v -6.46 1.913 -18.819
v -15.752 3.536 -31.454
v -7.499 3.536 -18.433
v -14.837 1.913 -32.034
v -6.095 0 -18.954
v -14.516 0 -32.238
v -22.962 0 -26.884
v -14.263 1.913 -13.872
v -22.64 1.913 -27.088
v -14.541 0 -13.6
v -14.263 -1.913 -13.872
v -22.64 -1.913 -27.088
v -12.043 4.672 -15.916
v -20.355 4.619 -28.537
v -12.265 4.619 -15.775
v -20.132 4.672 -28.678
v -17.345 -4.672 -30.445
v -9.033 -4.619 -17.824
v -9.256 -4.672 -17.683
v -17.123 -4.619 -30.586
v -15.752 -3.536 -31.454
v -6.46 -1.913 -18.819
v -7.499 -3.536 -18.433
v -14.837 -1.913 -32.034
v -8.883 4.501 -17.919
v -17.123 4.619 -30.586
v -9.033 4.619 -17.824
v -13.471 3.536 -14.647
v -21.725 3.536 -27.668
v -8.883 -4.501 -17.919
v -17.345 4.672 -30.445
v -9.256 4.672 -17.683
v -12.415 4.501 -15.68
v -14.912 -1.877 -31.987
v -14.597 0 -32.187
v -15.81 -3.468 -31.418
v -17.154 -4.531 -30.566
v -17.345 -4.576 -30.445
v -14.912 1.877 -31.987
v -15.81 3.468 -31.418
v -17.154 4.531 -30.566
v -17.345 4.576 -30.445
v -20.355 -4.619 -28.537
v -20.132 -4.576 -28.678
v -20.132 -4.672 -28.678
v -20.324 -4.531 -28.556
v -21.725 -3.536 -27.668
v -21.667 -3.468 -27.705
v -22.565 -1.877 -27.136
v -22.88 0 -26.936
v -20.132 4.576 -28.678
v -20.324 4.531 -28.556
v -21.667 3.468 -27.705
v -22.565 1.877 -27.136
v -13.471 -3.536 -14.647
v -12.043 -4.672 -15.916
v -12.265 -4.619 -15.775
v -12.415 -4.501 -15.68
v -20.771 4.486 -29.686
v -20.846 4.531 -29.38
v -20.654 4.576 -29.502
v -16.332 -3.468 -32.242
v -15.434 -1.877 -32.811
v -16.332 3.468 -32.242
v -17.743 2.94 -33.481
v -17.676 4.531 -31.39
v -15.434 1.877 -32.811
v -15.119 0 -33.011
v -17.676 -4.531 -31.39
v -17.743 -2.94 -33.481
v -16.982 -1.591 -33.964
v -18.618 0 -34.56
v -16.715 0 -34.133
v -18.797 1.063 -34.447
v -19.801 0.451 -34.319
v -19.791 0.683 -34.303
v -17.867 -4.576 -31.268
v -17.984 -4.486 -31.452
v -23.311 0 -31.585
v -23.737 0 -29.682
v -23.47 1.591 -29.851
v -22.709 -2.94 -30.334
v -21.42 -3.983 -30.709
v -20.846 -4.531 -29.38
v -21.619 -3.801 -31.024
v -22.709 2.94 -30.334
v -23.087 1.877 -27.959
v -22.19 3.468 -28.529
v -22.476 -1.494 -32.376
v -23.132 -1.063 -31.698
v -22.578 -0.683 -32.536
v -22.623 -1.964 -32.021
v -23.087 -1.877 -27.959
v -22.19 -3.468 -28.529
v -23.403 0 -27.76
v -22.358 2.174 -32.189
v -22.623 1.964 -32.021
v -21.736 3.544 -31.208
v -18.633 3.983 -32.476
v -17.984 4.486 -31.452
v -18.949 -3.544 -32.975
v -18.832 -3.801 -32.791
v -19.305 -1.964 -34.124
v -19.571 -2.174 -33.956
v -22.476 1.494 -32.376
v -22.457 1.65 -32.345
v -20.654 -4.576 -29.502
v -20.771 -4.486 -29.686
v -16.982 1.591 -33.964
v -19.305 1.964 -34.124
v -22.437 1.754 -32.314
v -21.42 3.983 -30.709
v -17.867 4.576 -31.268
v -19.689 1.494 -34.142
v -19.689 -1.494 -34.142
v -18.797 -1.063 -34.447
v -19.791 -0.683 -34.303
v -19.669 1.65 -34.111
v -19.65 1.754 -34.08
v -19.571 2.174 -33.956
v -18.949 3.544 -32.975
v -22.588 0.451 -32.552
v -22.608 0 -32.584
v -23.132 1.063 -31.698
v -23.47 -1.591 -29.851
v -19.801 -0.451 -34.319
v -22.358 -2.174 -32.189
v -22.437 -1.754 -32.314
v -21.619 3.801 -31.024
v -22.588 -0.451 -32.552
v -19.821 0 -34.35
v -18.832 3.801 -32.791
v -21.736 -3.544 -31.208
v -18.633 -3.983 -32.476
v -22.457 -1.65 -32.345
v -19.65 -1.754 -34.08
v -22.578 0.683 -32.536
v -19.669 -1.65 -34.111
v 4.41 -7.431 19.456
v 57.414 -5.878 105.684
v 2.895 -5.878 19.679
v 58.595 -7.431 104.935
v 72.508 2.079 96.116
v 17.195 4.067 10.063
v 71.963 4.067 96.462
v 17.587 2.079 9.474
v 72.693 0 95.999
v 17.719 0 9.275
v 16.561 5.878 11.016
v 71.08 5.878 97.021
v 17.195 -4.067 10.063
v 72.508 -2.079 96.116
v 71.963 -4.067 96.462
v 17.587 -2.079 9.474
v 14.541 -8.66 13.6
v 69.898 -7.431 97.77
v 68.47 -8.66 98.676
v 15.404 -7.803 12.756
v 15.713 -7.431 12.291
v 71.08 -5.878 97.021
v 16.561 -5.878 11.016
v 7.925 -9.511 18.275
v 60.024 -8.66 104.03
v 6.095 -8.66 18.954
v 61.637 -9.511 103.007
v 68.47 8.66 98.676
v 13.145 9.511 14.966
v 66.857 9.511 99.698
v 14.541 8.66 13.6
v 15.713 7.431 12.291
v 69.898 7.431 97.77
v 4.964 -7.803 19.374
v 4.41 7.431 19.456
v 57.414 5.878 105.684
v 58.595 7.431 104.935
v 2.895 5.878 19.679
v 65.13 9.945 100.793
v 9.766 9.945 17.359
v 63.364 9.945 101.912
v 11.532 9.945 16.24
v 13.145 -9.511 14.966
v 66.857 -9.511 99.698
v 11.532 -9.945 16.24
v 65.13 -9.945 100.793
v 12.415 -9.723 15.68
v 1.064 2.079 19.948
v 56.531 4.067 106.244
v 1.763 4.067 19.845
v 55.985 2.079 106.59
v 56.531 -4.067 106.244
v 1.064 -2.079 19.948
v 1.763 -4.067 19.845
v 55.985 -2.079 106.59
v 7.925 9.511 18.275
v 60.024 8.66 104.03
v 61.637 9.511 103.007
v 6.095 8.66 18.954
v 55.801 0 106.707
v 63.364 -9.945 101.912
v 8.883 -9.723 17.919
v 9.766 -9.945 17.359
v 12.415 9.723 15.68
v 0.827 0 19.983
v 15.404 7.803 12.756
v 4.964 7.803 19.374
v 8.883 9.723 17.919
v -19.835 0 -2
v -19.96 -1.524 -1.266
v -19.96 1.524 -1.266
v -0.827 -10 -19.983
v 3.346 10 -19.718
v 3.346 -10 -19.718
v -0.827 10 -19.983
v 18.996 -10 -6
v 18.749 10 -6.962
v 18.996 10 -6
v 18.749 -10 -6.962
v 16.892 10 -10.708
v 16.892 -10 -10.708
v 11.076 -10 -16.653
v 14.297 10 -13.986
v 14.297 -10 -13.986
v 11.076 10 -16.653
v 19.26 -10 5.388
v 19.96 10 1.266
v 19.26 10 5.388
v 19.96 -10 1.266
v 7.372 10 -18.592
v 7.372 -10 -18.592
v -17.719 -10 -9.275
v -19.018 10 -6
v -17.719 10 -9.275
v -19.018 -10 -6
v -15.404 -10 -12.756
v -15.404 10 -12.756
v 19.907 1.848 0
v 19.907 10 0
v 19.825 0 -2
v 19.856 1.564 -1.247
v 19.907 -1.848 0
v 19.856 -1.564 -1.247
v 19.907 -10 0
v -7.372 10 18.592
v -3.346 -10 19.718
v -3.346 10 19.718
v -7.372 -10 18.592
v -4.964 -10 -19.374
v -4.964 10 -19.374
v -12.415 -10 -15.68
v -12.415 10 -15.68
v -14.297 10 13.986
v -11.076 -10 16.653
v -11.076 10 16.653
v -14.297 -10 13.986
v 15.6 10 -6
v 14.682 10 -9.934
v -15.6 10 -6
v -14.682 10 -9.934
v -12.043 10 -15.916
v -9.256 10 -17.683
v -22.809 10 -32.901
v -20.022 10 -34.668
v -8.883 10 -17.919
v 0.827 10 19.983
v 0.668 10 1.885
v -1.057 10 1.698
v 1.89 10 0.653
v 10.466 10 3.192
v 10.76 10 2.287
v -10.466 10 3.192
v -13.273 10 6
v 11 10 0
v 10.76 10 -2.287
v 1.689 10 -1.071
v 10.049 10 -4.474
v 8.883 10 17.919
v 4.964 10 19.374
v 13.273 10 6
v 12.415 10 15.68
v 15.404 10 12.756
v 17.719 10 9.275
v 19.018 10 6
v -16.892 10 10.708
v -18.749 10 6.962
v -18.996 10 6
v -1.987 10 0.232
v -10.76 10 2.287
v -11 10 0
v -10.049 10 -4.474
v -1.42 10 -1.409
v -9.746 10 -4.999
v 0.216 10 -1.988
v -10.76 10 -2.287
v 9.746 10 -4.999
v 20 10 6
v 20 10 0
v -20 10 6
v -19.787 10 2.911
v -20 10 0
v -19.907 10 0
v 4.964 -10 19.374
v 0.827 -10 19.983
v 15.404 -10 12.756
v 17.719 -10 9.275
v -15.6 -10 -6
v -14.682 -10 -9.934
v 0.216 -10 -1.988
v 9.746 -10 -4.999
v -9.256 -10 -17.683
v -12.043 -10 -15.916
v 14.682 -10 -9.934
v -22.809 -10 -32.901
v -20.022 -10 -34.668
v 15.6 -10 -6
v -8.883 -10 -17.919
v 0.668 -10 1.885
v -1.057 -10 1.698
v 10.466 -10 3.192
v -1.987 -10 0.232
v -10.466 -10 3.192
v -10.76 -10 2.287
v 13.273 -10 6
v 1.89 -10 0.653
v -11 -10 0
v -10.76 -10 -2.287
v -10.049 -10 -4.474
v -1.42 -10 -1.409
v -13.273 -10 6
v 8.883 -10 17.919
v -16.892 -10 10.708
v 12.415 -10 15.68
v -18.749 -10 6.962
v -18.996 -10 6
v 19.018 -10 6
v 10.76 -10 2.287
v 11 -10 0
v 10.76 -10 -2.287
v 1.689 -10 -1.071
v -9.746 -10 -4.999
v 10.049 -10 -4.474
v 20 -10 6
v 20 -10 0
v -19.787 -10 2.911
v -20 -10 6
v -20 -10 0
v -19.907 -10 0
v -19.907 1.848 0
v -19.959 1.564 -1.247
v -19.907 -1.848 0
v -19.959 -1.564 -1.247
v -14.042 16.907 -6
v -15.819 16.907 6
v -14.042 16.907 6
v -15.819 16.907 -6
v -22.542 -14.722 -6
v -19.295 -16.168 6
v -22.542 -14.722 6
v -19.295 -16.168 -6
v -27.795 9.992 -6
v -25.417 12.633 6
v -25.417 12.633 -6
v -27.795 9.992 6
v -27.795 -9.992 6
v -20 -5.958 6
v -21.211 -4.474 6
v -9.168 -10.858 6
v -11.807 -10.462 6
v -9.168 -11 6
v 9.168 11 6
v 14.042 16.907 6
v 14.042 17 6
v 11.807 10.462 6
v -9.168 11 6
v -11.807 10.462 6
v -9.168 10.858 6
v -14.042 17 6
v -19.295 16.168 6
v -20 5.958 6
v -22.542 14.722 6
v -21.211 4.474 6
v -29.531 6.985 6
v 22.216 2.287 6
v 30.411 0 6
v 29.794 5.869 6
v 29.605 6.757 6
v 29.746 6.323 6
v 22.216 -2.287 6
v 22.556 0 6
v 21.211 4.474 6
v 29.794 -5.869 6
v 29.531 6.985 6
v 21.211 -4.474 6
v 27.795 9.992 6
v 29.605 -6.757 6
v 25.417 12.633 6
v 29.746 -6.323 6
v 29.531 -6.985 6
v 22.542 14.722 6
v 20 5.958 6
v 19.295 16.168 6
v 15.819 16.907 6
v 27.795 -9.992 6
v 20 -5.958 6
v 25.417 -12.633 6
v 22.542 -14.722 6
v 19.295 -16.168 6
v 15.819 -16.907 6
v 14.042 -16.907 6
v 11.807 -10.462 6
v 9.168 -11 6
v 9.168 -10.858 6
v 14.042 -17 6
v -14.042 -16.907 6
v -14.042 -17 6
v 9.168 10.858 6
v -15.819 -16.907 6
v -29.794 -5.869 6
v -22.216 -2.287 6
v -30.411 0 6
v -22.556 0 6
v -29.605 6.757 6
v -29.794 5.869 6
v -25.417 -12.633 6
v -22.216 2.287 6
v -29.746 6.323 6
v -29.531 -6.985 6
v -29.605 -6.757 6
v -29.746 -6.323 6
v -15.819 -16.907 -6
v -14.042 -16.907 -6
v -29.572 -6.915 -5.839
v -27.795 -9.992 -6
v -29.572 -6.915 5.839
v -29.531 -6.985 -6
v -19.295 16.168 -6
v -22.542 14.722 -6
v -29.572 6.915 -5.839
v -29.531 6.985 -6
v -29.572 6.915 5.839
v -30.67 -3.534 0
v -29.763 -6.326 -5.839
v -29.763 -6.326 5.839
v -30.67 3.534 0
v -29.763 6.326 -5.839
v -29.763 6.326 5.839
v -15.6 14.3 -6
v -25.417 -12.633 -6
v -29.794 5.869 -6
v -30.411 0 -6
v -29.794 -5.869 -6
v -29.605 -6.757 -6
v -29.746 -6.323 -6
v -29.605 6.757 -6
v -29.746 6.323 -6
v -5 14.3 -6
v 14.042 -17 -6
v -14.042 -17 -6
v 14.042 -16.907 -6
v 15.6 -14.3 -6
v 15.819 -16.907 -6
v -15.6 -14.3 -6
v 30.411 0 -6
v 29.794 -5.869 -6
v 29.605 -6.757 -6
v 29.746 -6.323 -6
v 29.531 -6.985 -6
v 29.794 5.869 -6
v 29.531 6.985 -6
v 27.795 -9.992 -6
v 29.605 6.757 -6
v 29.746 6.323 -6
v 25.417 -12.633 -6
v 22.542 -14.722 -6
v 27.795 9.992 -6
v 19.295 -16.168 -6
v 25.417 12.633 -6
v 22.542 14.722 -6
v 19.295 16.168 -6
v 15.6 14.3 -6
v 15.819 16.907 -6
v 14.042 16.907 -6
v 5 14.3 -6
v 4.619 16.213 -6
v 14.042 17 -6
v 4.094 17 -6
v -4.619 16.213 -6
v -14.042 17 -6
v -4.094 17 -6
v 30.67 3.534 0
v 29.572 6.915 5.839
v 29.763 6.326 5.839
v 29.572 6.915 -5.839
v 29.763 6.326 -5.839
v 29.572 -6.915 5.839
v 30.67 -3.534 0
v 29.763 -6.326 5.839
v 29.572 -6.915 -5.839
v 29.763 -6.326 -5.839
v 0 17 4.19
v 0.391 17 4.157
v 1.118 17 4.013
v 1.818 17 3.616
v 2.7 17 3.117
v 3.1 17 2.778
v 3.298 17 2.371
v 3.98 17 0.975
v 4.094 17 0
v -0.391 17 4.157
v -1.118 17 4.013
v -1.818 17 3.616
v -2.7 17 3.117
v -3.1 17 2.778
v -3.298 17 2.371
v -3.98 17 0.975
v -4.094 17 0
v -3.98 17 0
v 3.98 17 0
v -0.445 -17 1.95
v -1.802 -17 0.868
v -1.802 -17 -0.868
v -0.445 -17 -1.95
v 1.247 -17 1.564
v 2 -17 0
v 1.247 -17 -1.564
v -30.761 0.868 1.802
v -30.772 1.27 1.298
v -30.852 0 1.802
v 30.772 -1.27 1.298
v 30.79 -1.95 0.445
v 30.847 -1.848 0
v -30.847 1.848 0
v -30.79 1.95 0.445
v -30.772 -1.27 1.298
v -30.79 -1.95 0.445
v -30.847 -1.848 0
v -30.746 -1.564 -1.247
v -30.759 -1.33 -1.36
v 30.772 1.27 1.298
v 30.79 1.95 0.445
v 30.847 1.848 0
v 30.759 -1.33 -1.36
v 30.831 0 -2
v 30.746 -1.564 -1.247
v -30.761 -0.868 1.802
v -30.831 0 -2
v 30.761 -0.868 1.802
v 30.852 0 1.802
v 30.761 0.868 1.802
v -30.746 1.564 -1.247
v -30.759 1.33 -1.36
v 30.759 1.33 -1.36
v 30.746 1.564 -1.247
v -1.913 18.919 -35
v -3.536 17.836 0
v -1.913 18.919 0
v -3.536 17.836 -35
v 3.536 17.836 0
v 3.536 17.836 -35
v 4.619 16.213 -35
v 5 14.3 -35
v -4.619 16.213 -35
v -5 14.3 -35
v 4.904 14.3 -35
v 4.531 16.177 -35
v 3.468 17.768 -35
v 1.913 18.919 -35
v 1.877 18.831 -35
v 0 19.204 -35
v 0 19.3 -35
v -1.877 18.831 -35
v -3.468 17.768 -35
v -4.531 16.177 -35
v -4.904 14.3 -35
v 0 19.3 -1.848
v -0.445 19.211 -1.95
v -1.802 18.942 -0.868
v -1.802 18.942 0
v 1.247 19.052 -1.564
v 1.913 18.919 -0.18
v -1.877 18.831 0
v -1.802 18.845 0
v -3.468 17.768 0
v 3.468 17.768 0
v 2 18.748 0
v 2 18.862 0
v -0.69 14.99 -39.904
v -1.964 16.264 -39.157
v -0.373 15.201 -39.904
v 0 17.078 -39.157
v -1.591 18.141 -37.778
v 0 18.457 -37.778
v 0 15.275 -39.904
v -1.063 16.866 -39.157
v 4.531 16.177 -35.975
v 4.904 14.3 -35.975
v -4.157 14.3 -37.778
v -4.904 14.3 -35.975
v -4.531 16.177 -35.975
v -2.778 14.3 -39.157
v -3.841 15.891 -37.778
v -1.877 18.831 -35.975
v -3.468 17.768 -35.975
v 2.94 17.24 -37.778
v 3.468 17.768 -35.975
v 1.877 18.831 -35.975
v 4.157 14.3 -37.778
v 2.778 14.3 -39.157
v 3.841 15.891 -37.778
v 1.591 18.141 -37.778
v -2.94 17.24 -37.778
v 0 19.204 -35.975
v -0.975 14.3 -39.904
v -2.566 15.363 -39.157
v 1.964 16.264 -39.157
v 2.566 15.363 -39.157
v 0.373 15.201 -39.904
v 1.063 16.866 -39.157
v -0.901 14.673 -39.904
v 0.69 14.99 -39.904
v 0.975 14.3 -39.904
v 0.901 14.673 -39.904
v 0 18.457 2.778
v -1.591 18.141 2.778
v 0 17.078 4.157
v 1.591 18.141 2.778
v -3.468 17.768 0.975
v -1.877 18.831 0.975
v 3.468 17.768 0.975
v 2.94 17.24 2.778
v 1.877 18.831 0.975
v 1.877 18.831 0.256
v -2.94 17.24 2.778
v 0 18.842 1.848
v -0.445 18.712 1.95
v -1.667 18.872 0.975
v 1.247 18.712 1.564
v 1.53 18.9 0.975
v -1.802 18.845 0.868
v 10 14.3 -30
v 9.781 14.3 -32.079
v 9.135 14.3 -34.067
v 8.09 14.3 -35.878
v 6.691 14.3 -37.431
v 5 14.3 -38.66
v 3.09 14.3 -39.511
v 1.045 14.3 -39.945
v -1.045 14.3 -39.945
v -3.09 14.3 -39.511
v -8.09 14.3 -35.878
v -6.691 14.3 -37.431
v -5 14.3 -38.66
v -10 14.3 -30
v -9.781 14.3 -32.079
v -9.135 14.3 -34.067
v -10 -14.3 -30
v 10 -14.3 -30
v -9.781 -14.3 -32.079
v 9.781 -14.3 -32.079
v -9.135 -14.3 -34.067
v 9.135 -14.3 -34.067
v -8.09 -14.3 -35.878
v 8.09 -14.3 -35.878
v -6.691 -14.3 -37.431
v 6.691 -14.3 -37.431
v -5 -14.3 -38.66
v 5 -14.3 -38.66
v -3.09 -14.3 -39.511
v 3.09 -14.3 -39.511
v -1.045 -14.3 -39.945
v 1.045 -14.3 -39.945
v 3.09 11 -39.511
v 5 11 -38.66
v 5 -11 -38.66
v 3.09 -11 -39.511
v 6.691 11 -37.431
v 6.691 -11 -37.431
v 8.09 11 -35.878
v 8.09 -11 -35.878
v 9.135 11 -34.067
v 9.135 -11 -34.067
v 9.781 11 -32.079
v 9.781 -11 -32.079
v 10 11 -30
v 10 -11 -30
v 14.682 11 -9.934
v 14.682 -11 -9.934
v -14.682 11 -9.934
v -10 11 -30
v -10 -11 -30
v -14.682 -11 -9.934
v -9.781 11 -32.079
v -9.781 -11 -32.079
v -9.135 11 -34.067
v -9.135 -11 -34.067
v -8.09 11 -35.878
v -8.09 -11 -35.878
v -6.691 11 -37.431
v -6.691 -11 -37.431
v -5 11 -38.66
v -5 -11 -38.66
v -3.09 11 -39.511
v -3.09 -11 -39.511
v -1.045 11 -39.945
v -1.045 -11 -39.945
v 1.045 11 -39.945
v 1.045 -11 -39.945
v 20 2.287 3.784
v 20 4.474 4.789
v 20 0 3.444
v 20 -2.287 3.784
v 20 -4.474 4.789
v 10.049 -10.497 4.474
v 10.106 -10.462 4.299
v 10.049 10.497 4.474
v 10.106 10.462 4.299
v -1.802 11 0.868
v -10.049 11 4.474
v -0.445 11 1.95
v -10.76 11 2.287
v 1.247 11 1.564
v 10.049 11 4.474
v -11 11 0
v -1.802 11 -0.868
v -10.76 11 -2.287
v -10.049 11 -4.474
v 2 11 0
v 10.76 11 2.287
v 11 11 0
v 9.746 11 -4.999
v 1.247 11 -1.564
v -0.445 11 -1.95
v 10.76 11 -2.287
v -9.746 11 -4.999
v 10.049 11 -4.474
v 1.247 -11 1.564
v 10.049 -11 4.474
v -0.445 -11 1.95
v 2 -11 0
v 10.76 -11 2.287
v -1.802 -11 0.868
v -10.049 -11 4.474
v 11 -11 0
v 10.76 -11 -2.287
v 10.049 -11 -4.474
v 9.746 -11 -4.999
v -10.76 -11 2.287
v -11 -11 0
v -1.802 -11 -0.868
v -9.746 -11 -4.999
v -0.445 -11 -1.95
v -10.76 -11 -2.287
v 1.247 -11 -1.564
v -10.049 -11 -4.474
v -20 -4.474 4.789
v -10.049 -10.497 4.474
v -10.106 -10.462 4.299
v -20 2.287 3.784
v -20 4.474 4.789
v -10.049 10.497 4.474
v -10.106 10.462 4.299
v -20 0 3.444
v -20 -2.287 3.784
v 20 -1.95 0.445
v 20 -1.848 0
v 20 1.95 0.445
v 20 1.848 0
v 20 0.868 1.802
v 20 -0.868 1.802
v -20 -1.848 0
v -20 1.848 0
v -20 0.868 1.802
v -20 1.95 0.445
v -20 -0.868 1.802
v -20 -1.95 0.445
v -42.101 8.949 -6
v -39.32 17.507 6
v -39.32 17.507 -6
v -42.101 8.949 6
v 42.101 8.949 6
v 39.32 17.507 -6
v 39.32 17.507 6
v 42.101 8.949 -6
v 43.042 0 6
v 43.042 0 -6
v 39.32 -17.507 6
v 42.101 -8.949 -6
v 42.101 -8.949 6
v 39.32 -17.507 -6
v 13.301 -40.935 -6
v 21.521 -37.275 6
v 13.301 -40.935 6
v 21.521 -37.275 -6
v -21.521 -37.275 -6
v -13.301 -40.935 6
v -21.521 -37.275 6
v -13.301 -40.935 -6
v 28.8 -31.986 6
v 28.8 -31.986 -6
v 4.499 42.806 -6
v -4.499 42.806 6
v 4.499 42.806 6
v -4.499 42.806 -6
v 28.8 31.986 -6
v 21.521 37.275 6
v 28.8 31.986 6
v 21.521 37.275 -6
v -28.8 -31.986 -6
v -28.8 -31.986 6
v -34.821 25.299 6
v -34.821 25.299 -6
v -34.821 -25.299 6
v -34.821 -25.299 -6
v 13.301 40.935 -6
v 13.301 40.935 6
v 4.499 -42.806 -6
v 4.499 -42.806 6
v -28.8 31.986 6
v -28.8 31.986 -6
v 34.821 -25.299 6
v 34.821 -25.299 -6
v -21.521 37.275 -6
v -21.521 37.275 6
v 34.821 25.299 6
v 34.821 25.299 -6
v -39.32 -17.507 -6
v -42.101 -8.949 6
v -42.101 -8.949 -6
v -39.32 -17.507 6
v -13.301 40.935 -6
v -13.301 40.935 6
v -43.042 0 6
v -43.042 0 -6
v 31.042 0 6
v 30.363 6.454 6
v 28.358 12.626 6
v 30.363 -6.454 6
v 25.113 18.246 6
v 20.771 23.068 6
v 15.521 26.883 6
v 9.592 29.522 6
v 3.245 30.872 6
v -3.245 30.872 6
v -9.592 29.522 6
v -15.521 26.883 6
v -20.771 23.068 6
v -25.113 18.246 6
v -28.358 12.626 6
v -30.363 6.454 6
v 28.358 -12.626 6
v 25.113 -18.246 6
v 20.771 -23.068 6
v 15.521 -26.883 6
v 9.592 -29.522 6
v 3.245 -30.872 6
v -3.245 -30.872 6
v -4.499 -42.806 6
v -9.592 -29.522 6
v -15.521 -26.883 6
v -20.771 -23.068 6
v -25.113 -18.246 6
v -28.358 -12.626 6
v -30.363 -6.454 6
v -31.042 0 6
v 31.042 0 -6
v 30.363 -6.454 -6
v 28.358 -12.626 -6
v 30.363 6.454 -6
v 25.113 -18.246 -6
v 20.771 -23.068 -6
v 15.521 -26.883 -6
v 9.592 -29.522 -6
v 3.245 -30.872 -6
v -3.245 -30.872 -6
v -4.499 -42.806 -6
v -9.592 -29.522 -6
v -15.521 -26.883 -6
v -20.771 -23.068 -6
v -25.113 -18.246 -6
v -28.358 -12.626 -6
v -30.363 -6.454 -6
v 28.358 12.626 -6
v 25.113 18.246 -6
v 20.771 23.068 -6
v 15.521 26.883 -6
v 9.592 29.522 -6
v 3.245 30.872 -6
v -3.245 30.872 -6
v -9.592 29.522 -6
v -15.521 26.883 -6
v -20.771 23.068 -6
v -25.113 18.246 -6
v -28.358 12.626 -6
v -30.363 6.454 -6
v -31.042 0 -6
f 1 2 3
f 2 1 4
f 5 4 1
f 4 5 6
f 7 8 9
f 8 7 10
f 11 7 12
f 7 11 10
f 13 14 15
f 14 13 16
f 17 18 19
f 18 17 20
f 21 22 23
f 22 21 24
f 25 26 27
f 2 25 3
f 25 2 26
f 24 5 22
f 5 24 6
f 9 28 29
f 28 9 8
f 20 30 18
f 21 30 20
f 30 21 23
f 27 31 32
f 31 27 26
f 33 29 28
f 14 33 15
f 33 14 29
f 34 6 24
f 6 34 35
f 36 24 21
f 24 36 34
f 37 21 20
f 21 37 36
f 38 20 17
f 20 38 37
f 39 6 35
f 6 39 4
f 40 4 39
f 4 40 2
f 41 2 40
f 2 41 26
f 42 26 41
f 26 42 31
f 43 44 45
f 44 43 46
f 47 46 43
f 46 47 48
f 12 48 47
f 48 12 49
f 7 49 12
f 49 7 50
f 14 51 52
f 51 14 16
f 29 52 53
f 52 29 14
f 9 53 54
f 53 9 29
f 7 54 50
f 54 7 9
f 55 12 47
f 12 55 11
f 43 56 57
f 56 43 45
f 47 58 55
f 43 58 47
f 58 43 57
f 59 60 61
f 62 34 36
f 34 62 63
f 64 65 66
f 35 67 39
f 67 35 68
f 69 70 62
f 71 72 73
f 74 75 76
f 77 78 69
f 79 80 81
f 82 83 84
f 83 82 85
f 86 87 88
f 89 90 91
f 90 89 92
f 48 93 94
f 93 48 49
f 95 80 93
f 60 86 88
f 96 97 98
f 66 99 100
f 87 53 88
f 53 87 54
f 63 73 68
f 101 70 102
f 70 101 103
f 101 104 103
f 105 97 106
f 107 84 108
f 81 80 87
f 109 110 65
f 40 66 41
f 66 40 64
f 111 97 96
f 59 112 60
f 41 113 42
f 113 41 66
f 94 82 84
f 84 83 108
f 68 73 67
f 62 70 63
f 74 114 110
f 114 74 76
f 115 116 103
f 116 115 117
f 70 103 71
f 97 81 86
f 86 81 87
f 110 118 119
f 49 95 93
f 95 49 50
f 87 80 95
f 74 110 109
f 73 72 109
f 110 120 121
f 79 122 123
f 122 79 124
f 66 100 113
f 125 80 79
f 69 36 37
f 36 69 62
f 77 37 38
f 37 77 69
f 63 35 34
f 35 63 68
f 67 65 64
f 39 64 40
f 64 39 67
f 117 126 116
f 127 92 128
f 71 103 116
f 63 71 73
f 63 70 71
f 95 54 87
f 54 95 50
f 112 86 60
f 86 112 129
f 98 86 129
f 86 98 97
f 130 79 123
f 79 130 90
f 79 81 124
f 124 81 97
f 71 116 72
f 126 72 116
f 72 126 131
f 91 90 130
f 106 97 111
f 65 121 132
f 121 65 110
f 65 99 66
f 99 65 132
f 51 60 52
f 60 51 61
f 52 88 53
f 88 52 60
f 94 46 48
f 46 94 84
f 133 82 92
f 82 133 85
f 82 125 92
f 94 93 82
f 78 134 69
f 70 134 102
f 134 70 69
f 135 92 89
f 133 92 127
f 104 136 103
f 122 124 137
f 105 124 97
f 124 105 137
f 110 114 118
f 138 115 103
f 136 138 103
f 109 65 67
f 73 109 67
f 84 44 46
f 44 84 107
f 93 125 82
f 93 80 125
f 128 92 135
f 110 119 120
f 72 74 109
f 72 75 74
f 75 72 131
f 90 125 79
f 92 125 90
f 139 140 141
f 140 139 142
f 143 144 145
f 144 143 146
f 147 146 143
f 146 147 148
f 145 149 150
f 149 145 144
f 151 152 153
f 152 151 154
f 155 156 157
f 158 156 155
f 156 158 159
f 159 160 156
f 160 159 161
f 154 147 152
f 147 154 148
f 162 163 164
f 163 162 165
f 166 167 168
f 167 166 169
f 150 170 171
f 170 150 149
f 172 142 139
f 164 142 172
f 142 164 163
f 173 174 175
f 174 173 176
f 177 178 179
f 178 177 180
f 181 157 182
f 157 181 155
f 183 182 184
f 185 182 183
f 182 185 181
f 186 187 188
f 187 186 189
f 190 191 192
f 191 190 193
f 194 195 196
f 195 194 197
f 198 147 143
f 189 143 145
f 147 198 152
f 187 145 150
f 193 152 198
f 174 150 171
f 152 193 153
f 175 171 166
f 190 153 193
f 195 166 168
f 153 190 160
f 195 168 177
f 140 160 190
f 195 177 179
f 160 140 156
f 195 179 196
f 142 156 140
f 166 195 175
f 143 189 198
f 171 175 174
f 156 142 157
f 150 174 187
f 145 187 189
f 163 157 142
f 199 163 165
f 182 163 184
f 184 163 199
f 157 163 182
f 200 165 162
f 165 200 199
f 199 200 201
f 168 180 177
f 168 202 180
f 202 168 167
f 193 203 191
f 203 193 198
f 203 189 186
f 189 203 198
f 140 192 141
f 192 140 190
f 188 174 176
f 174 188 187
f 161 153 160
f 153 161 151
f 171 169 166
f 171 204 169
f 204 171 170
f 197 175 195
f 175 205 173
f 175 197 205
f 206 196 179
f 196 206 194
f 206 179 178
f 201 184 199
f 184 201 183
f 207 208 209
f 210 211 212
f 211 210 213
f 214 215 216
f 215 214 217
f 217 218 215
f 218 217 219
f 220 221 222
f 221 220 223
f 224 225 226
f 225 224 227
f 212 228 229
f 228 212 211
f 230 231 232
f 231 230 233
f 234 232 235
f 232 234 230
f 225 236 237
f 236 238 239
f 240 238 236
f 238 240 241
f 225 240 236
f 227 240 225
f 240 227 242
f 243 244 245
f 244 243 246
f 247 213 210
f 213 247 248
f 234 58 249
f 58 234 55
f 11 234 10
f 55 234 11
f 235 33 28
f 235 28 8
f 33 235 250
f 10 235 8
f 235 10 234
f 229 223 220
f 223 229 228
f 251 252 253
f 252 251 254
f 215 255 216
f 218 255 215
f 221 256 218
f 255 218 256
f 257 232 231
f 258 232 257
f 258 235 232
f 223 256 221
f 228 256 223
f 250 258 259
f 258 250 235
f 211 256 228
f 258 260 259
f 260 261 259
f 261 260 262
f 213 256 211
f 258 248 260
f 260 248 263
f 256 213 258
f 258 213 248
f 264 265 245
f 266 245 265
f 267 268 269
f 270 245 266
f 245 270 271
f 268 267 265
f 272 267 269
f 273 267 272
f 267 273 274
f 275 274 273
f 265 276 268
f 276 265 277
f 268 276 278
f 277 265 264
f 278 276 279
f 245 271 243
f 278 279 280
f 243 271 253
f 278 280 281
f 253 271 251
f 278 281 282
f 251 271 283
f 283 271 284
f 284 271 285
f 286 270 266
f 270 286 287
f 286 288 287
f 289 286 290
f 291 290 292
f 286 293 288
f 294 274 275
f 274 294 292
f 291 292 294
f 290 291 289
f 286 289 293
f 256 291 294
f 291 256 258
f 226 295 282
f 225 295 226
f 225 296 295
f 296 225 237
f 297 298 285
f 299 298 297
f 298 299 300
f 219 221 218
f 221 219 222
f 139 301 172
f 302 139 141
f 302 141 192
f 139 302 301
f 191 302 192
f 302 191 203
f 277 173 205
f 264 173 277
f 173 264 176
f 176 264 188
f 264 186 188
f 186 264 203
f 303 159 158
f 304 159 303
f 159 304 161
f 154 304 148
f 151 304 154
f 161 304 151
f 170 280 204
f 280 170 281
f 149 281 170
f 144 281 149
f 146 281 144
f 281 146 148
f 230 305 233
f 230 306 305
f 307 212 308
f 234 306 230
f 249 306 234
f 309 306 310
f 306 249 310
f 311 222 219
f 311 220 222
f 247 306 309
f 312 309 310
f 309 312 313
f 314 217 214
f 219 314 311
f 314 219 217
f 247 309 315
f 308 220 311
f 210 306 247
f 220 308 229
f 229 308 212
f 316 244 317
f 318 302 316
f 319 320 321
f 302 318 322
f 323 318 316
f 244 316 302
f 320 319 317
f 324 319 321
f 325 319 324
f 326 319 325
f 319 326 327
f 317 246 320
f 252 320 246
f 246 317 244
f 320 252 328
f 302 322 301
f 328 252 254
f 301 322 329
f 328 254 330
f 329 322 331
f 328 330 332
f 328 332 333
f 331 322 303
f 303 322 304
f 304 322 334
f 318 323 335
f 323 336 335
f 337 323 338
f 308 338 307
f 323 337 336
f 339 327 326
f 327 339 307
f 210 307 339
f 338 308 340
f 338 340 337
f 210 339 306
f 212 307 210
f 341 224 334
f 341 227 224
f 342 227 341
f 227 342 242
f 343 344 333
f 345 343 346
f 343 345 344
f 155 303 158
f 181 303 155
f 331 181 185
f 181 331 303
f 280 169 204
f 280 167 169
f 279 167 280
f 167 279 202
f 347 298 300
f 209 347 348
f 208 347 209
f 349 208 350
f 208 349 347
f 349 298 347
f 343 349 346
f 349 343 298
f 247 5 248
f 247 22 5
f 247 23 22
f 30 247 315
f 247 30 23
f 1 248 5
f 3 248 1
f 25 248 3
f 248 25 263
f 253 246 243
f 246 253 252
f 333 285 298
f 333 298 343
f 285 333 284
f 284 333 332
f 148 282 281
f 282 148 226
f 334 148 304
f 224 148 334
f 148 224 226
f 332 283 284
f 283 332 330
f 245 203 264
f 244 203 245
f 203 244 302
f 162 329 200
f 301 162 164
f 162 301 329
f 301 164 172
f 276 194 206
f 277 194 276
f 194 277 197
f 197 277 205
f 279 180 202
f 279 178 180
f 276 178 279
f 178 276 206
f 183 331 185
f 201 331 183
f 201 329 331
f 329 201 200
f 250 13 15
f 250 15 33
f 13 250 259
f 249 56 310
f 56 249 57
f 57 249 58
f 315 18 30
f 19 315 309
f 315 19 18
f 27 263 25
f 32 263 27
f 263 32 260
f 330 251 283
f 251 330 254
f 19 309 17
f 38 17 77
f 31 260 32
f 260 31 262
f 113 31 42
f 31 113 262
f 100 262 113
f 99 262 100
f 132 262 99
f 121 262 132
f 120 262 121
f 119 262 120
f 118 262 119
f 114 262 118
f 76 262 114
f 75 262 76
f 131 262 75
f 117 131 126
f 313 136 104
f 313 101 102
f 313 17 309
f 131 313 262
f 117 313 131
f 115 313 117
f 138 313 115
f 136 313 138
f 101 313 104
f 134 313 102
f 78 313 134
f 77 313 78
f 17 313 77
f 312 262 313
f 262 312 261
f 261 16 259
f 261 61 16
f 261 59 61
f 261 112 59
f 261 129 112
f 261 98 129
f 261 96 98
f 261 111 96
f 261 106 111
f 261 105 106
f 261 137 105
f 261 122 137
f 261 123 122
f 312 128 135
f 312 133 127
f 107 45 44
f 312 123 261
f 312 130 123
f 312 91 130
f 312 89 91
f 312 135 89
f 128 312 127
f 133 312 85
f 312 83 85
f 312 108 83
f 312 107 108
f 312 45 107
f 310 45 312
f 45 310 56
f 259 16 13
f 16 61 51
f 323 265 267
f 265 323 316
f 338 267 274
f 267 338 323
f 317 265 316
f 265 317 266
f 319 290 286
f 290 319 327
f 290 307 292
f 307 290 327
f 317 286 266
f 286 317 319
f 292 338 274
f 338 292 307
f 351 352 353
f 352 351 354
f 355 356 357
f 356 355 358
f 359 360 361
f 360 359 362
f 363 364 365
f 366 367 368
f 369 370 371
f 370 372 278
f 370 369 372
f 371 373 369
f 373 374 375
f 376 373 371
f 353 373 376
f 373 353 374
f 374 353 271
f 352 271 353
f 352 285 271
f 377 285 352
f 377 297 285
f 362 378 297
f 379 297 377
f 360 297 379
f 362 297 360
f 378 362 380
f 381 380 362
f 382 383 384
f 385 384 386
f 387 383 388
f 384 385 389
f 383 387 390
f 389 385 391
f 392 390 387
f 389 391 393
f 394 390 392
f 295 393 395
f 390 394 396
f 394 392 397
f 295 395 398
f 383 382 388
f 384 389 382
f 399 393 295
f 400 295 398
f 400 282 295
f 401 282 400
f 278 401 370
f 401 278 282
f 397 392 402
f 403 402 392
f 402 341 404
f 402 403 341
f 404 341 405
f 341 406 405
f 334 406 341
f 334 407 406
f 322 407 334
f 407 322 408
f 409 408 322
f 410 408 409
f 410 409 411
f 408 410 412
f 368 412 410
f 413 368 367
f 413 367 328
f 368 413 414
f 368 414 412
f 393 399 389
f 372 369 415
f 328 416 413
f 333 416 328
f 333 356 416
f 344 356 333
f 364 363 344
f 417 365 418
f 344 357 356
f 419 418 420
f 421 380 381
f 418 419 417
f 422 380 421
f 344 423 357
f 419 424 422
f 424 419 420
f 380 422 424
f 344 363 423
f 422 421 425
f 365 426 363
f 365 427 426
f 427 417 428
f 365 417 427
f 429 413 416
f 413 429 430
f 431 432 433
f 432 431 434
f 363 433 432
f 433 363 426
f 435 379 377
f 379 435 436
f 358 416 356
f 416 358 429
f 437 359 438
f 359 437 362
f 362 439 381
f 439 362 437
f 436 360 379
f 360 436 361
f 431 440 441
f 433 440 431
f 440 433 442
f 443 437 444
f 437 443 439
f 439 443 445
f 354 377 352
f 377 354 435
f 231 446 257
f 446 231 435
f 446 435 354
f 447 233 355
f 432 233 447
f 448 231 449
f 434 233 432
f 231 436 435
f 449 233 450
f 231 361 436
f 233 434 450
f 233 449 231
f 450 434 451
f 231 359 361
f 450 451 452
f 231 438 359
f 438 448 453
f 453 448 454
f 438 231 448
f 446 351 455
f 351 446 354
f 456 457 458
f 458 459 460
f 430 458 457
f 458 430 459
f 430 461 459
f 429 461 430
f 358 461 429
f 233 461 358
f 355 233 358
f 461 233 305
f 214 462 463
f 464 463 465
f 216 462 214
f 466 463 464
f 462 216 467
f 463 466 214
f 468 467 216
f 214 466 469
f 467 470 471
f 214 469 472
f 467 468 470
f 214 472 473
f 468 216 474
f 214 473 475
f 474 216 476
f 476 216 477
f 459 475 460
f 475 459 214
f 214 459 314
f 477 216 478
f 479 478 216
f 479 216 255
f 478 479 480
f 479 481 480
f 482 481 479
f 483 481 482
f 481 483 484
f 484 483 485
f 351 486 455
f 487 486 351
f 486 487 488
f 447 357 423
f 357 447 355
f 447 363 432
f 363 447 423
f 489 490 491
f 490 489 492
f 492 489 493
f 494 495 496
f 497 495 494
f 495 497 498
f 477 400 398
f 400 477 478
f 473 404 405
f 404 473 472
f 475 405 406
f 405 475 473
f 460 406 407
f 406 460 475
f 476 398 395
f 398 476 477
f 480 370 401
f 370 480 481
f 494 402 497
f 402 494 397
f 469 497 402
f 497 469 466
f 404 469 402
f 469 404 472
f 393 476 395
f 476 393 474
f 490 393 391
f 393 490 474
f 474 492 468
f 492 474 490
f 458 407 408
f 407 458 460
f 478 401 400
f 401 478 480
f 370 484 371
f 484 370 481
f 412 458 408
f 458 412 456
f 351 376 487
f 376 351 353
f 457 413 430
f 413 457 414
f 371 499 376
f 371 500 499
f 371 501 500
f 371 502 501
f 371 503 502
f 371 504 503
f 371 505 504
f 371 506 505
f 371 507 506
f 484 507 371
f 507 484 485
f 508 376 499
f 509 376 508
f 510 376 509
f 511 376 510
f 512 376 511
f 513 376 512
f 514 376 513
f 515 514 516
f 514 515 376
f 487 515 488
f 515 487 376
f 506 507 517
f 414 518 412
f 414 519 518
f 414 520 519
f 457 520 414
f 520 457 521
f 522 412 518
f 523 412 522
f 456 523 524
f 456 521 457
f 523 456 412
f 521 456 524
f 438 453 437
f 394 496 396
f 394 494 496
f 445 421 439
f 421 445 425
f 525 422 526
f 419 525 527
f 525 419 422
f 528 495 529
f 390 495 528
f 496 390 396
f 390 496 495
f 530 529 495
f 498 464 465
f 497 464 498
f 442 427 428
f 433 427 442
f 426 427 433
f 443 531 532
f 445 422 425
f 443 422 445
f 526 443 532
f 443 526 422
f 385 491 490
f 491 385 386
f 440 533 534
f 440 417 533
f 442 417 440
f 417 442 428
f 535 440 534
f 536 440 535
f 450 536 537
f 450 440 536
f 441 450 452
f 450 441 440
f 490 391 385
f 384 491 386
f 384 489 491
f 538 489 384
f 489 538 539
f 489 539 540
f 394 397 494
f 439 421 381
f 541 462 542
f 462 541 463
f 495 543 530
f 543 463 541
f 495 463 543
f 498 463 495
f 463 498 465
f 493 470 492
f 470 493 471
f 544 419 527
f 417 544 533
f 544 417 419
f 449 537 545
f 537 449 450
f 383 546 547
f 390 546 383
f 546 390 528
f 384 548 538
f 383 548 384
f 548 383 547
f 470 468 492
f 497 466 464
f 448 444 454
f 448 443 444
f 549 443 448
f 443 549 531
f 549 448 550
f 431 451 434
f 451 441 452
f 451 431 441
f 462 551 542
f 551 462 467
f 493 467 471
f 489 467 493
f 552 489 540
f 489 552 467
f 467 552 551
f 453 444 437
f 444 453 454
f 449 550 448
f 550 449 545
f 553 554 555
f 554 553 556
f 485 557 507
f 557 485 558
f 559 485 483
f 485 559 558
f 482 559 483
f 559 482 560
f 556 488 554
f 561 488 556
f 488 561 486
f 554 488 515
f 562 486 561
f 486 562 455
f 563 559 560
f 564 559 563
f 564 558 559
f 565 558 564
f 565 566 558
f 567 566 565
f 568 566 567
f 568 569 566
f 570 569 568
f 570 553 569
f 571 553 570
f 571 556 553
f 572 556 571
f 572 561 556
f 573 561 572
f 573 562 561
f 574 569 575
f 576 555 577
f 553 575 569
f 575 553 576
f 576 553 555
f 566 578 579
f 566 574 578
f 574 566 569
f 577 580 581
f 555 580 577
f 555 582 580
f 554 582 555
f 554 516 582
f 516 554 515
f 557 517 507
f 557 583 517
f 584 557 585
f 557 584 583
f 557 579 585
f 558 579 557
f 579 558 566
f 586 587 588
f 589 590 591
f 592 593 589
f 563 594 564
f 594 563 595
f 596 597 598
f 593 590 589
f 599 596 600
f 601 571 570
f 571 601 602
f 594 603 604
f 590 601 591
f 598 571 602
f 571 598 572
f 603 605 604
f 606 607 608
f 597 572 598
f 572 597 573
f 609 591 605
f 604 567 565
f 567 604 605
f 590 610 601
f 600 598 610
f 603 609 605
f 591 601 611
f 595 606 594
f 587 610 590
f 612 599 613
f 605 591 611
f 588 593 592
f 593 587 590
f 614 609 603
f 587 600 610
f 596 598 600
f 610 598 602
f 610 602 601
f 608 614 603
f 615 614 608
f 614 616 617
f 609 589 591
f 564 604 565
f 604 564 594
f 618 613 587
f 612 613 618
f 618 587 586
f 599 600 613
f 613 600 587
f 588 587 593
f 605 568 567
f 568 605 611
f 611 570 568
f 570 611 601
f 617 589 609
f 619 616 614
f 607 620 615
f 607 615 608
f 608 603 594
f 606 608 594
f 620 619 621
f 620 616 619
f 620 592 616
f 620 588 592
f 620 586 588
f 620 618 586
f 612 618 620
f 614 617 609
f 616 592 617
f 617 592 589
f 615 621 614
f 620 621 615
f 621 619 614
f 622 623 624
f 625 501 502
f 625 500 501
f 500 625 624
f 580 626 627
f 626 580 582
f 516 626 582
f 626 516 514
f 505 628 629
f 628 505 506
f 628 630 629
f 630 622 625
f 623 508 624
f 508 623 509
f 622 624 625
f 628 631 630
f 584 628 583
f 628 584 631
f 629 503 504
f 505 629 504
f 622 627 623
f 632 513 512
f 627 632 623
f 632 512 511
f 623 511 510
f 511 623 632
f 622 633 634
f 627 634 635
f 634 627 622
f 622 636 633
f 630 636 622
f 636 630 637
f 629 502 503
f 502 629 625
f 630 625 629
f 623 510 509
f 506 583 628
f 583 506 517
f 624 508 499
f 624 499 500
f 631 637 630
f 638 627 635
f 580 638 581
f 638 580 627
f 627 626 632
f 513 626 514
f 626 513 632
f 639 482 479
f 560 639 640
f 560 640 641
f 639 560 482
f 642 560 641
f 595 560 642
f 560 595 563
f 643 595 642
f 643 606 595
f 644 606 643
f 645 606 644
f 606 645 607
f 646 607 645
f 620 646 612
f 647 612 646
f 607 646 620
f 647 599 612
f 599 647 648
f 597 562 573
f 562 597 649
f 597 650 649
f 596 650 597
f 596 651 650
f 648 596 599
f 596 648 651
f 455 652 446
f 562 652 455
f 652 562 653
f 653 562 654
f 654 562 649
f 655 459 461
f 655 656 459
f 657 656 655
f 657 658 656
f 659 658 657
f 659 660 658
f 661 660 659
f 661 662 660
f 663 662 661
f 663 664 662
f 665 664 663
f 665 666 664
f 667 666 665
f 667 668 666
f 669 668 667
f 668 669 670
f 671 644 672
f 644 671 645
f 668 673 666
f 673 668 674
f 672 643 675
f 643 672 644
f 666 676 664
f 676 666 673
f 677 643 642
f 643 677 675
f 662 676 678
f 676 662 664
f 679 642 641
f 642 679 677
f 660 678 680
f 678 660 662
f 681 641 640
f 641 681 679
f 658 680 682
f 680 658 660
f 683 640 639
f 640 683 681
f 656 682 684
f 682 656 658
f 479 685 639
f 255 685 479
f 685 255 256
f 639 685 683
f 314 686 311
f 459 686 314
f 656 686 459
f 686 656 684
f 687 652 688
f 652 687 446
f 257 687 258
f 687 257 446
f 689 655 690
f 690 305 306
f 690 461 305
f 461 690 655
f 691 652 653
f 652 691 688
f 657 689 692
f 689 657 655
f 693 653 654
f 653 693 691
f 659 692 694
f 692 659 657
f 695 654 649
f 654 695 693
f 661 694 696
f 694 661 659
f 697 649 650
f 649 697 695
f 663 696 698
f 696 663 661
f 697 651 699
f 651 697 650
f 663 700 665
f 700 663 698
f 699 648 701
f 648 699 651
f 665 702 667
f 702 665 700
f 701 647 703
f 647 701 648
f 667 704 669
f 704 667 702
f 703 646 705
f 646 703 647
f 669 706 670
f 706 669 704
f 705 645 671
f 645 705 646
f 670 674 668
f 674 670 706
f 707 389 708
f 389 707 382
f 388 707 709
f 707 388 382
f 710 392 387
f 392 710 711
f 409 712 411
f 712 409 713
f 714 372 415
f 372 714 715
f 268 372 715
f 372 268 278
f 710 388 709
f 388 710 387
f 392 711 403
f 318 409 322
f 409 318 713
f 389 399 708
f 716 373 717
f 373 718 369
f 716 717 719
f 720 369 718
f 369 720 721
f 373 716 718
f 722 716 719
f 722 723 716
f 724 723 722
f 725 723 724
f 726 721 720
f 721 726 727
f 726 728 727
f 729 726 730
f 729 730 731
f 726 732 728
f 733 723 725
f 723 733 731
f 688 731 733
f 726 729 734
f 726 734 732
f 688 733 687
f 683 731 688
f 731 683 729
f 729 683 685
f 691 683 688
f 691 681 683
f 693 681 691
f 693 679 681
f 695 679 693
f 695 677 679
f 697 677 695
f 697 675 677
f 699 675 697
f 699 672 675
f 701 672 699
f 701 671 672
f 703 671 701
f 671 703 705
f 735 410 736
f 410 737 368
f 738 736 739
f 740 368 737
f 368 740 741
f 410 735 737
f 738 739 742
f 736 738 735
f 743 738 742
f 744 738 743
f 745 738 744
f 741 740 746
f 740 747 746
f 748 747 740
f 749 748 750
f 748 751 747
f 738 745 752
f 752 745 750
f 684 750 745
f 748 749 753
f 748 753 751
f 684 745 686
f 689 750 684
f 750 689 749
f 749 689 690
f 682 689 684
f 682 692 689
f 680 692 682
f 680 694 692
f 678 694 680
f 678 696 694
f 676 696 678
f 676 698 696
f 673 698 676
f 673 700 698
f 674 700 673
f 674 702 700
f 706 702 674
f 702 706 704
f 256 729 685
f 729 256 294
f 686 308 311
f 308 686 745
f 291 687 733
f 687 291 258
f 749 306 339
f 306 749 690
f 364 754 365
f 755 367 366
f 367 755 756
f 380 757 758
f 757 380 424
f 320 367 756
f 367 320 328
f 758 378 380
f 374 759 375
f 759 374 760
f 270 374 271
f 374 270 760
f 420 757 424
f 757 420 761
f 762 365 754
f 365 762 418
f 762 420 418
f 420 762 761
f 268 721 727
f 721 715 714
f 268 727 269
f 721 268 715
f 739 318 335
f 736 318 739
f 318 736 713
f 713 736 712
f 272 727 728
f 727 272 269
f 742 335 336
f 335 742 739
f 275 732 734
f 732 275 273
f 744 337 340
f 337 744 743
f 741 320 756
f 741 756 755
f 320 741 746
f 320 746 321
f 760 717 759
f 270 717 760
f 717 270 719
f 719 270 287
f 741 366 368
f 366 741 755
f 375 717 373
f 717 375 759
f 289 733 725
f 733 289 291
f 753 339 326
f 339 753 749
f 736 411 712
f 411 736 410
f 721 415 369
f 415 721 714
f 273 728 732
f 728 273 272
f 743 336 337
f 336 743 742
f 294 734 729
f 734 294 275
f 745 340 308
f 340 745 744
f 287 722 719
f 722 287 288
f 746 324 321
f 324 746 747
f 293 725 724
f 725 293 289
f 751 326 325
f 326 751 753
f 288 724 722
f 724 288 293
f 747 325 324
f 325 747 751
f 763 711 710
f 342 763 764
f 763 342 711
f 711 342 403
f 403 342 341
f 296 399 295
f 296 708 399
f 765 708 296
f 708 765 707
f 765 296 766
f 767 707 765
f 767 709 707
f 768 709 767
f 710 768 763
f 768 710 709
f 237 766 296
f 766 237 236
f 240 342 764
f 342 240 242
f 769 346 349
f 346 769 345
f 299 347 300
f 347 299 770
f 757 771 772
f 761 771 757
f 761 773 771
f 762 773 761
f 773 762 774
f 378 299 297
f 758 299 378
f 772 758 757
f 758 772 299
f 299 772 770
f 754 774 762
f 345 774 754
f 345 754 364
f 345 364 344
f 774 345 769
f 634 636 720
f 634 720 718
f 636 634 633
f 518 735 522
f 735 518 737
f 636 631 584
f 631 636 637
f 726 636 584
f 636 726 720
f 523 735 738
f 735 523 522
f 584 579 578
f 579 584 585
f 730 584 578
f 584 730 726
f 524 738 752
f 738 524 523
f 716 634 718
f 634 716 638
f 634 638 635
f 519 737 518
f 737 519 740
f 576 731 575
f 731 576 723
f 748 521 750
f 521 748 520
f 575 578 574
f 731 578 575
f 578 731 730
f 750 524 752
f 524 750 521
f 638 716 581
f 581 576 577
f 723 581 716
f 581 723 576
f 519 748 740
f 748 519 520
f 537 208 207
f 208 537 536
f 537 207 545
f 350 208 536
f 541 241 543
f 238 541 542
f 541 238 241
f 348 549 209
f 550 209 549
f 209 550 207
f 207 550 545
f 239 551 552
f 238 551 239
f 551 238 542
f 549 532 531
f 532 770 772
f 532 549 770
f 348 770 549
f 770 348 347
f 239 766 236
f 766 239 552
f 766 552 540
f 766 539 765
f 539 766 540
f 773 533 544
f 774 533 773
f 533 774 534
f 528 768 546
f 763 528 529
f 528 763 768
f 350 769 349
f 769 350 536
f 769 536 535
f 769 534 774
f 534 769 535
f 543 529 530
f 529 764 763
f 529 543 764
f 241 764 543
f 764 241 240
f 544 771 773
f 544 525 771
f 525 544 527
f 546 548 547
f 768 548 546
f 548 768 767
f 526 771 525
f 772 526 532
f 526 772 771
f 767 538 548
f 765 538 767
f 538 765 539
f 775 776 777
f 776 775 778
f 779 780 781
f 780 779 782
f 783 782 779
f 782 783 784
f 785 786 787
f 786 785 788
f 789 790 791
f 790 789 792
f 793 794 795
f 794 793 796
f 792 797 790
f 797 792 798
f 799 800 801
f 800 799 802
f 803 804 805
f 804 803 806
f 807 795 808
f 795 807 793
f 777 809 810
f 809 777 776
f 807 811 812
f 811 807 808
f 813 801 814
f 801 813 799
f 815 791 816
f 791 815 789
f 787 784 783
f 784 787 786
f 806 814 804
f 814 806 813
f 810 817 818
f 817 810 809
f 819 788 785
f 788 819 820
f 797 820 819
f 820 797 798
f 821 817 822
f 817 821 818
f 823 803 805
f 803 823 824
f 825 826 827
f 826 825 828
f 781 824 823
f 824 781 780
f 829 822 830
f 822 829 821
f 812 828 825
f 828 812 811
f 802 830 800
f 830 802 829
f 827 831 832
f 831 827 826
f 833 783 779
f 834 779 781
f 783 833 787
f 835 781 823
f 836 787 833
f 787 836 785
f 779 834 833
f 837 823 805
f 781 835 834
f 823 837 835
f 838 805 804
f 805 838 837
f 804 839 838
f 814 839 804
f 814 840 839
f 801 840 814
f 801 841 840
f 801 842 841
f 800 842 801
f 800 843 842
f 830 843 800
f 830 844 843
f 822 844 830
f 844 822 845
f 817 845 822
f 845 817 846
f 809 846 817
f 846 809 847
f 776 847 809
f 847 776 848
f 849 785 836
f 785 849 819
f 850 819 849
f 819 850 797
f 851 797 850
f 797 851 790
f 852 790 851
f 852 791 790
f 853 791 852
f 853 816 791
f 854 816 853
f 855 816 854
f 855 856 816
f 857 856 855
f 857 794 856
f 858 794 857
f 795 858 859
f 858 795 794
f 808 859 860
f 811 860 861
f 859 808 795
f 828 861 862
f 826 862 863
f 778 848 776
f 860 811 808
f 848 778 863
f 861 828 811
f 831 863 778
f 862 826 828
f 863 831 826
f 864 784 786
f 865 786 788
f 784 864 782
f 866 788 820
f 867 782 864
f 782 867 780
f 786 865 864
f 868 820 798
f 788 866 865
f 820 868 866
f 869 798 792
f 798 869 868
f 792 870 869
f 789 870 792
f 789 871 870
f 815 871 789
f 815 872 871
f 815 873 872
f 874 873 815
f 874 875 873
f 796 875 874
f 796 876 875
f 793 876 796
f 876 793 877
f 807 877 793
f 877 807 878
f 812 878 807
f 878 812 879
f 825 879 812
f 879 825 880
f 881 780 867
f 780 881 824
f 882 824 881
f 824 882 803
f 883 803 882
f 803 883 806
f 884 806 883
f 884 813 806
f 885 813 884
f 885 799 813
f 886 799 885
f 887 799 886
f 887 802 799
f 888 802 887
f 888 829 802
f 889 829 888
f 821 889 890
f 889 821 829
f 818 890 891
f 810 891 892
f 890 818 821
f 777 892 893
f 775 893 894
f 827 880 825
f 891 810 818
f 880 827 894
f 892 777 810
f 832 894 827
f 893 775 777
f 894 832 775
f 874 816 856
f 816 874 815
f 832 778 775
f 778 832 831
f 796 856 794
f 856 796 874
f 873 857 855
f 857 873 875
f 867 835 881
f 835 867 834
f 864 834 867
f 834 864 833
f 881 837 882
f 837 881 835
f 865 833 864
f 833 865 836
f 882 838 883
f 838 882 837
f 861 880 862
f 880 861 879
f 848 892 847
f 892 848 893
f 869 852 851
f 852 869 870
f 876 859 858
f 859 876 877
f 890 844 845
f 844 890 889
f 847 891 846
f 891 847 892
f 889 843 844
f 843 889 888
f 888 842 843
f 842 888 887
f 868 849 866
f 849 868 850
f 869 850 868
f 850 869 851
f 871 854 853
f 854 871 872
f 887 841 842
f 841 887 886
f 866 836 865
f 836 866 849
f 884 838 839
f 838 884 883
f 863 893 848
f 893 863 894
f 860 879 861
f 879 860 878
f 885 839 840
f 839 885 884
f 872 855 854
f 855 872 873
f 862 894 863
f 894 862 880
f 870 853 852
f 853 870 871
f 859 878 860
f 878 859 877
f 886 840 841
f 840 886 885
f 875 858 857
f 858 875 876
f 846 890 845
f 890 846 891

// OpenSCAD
//
//  Copyright (C) 13-02-2012 Jasper den Ouden.
//
//  This is free software: you can redistribute it and/or modify
//  it under the terms of the GNU General Public License as published
//  by the Free Software Foundation, either version 3 of the License, or
//  (at your option) any later version.
//

r = 10;
node_r = 2*r;

hinge_r = 2;
hinge_d = 3*hinge_r;

space_d = 1;

phi_limit = 45;

up_l = 120;
down_l = 40;

theta_h = 30;
theta_d = 6;

//theta_w = 2*(theta_h*tan(phi_limit) + space_d + theta_d);
theta_w = 2*max(hinge_d*tan(phi_limit) + 
                (r + theta_d + space_d)/cos(phi_limit) +
                space_d,
              node_r + space_d + hinge_d);
max_l = max(up_l,down_l);

plate_w = 3.3;

bottom_r = 10;

theta_reinforce_d = 5;
phi_reinforce_d = r/2;

module swivel_theta_mount_1(){}
module swivel_theta_mount_2(){ sphere(4); }

module swivel_phi()
{ difference()
    { union()
        { cylinder(h=up_l , r=r);
          rotate(a=90,v=[1,0,0]) translate([0,0,-r])
              cylinder(h=2*r, r=node_r);
          translate([-plate_w/2,-r,-down_l]) cube([plate_w, 2*r,down_l]);
          translate([0,0,phi_reinforce_d-down_l]) union()
          { cylinder(h=down_l,r=phi_reinforce_d);
            sphere(phi_reinforce_d);
          }
        }
      rotate(a=90,v=[1,0,0]) translate([0,0,-2*r]) cylinder(h=4*r, r=hinge_r);
    }
}

module swivel_center_cutter()
{ cylinder(h=up_l+space_d, r= r+space_d);
  translate([-plate_w/2-space_d,-r-space_d,-down_l]) 
      cube([plate_w+2*space_d, 2*(r+space_d),down_l+2*space_d]);
  translate([0,0,-down_l]) cylinder(r=phi_reinforce_d, h=down_l);
}

module swivel_center_cut()
{
  rotate(a=90,v=[1,0,0]) translate([0,0,-r-space_d]) 
      linear_extrude(height = 2*(r+space_d)) union()
  { intersection()
      { polygon([[space_d,0], 
                 [space_d+2*up_l*sin(phi_limit), 2*up_l*cos(phi_limit)],
                 [0,2*up_l],
                 [-space_d-2*up_l*sin(phi_limit), 2*up_l*cos(phi_limit)], 
                 [-space_d,0]]);
        circle(sqrt(pow(up_l,2)+pow(plate_w/2,2))+space_d);
      }
    intersection()
    { polygon([[space_d,0], 
               [space_d+2*down_l*sin(phi_limit), -2*down_l*cos(phi_limit)],
               [0,-2*down_l],
               [-space_d-2*down_l*sin(phi_limit), -2*down_l*cos(phi_limit)], 
               [-space_d,0]]);
      circle(sqrt(pow(down_l,2)+pow(plate_w/2,2))+space_d);
    }
  }
  translate([space_d,0]) rotate(a= phi_limit,v=[0,1,0]) 
      swivel_center_cutter();
  translate([space_d,0]) rotate(a=-phi_limit,v=[0,1,0]) 
        swivel_center_cutter();

  translate([-space_d,0]) rotate(a= phi_limit,v=[0,1,0]) 
      swivel_center_cutter();
  translate([-space_d,0]) rotate(a=-phi_limit,v=[0,1,0]) 
      swivel_center_cutter();
  
  rotate(a=90,v=[1,0,0]) translate([0,0,-r-space_d]) 
      cylinder(h=2*(r+space_d), r= r+space_d);
}

round_r = r+space_d+theta_d;
module swivel_theta_base()
{
    intersection()
    { translate([0,0,-hinge_d]) union()
        {
            translate([-theta_w/2 + round_r,0]) 
                cylinder(r=round_r, h=2*hinge_d); 
            translate([theta_w/2 - round_r,0])
                cylinder(r=round_r, h=2*hinge_d);
            
            translate([-theta_w/2+round_r,-round_r]) 
                cube([theta_w-2*round_r, 2*round_r, 2*hinge_d]);
        }
      sphere(theta_w/2);
    }
}

module theta_tube_reinforcement()
{
    translate([0,r+plate_w+space_d]) union()
    { sphere(theta_reinforce_d);
      translate([0, 0,-down_l+theta_reinforce_d]) union() 
      { cylinder(r= theta_reinforce_d, h= down_l - theta_reinforce_d);
        sphere(theta_reinforce_d);
      }
    }
}

module theta_reinforcement()
{ theta_tube_reinforcement(); }

module swivel_theta()
{ difference()
    { union()
        { swivel_theta_base();
          
//          rotate(a=-90,v=[1,0,0]) 
//              cylinder(r=hinge_d, h= r+plate_w+space_d+theta_reinforce_d);
          theta_reinforcement();
            
          rotate(a=90,v=[1,0,0]) translate([0,0,-r-plate_w-space_d]) 
              linear_extrude(height = 2*(r+plate_w+space_d)) union()
          { polygon([[r+hinge_d+space_d,0], [-r-hinge_d-space_d,0],
                     [-bottom_r, bottom_r-down_l,], 
                     [bottom_r,  bottom_r-down_l]]);
            translate([0,bottom_r-down_l]) circle(bottom_r);
          }
        }
      translate([-node_r, -r]) cube([2*node_r, 2*r, node_r]);
      swivel_center_cut();
      rotate(a=90,v=[1,0,0]) translate([0,0,-2*theta_w]) 
          cylinder(h=4*theta_w, r=hinge_r);
      rotate(a=90,v=[0,1,0]) translate([0,0,-2*theta_w]) 
          cylinder(h=4*theta_w, r=hinge_r);
    }
}

holder_h = 2*hinge_d;
holder_rp = 2*hinge_d;

module swivel_holder()
{ translate([0,0,-holder_h/2]) difference()
    { cylinder(r= theta_w/2+holder_rp, h= holder_h);
      translate([0,0,-hinge_d]) cylinder(r= theta_w/2, 
                                         h= holder_h+2*hinge_d);
    }
}
//swivel_center_cut();
theta = 45*sin(360*$t);
phi = 45*cos(360*$t+44);

rotate(v=[1,0,0], a=theta) rotate(v=[0,1,0], a=phi) color([0,0,1]) 
swivel_phi();
rotate(v=[1,0,0], a=theta) swivel_theta();
swivel_holder();
